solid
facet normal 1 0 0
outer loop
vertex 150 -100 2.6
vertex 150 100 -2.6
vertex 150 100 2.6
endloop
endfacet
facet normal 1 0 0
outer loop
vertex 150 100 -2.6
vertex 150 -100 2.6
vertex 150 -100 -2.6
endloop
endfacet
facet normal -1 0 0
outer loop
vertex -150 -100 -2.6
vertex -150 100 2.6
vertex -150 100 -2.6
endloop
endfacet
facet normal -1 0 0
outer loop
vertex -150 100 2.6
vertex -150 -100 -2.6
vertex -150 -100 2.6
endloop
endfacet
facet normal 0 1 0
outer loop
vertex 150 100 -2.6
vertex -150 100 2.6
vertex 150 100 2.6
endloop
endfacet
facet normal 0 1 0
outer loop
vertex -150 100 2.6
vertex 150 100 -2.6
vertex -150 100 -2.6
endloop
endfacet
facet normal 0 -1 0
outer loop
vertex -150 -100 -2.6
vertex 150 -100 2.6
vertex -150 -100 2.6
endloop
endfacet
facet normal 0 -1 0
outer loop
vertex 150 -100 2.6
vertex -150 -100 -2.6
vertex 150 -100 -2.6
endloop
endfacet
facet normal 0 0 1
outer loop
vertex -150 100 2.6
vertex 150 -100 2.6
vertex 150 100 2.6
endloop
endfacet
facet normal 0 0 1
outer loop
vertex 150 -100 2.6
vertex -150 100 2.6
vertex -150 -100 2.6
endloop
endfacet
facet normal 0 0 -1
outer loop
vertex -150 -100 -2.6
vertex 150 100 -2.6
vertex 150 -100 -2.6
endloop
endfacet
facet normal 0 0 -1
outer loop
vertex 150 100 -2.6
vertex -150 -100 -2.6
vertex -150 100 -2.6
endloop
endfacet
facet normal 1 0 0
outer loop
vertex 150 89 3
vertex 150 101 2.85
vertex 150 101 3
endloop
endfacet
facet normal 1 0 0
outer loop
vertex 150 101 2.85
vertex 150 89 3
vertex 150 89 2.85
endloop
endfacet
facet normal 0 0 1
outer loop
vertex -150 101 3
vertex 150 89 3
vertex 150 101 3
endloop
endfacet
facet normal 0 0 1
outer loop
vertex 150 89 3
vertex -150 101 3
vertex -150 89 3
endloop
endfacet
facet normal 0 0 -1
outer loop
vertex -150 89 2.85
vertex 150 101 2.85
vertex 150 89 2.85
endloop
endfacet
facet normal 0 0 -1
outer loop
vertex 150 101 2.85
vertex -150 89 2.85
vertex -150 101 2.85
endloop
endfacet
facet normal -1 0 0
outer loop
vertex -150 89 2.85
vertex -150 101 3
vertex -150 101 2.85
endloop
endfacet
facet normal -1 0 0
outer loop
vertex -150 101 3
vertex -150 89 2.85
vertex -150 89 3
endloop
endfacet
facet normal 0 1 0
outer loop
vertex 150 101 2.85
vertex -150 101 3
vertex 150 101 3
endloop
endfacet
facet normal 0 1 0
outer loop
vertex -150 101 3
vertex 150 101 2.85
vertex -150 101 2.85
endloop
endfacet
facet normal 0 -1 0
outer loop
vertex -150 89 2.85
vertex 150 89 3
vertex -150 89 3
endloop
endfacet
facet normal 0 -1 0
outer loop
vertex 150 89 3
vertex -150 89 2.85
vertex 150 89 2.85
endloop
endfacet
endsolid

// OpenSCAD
// Parameters
sheet_L = 300; //[150:600:1]
sheet_W = 200; //[100:400:1]
sheet_T = 4; //[2:8:0.1]
liner_T = 0.4; //[0.2:0.8:0.05]
flute_pitch = 8; //[4:16:0.5]
flute_amp = 1.6; //[0.8:3.2:0.1]
corner_R = 6; //[0:20:0.5]
overlap = 1; //[0.5:2:0.1]
tolerance = 0.2; //[0:0.6:0.05]
edge_detail_depth = 1.2; //[0:4:0.1]
edge_detail_enable = 1; //[0:1:1]
texture_depth = 0.15; //[0:0.4:0.05]
texture_pitch = 12; //[6:30:1]

// Base Shapes
module cardboard_sheet_body() {
  cube([sheet_L, sheet_W, sheet_T], center=true);
}

module top_liner_layer() {
  translate([0, 0, sheet_T/2 - liner_T/2])
    cube([sheet_L, sheet_W, liner_T], center=true);
}

module bottom_liner_layer() {
  translate([0, 0, -sheet_T/2 + liner_T/2])
    cube([sheet_L, sheet_W, liner_T], center=true);
}

module fluted_core_layer() {
  cube([sheet_L, sheet_W, sheet_T - 2*liner_T + 2*overlap], center=true);
}

module edge_exposed_flute_detail() {
  linear_extrude(height=edge_detail_depth*edge_detail_enable, center=true)
    translate([sheet_L/2 - (edge_detail_depth*edge_detail_enable)/2 + overlap, 0, 0])
    rotate([0, 90, 0])
    polygon(points=[
      [sheet_W/2, sheet_T/2],
      [sheet_W/2, -sheet_T/2],
      [-sheet_W/2, -sheet_T/2],
      [-sheet_W/2, sheet_T/2]
    ]);
}

module surface_texture() {
  translate([0, sheet_W/2 - texture_pitch/2 + overlap, sheet_T/2 - texture_depth/2 + overlap])
    cube([sheet_L, texture_pitch, texture_depth], center=true);
}

module rounded_corners_cutout() {
  translate([sheet_L/2 - corner_R, sheet_W/2 - corner_R, 0])
    cylinder(r=corner_R, h=sheet_T + 2*overlap, center=true);
}

module manufacturing_tolerances_inset() {
  cube([sheet_L - 2*tolerance, sheet_W - 2*tolerance, sheet_T - 2*tolerance], center=true);
}

// Operations
module rounded_corners() {
  difference() {
    cardboard_sheet_body();
    rounded_corners_cutout();
    mirror([1, 0, 0]) rounded_corners_cutout();
    mirror([0, 1, 0]) rounded_corners_cutout();
    mirror([1, 1, 0]) rounded_corners_cutout();
  }
}

module sheet_layers_union() {
  union() {
    rounded_corners();
    top_liner_layer();
    bottom_liner_layer();
    fluted_core_layer();
  }
}

module sheet_with_edge_detail() {
  union() {
    sheet_layers_union();
    edge_exposed_flute_detail();
  }
}

module sheet_with_surface_texture() {
  union() {
    sheet_with_edge_detail();
    surface_texture();
  }
}

module manufacturing_tolerances() {
  union() {
    sheet_with_surface_texture();
    manufacturing_tolerances_inset();
  }
}

// Final Output
manufacturing_tolerances();
